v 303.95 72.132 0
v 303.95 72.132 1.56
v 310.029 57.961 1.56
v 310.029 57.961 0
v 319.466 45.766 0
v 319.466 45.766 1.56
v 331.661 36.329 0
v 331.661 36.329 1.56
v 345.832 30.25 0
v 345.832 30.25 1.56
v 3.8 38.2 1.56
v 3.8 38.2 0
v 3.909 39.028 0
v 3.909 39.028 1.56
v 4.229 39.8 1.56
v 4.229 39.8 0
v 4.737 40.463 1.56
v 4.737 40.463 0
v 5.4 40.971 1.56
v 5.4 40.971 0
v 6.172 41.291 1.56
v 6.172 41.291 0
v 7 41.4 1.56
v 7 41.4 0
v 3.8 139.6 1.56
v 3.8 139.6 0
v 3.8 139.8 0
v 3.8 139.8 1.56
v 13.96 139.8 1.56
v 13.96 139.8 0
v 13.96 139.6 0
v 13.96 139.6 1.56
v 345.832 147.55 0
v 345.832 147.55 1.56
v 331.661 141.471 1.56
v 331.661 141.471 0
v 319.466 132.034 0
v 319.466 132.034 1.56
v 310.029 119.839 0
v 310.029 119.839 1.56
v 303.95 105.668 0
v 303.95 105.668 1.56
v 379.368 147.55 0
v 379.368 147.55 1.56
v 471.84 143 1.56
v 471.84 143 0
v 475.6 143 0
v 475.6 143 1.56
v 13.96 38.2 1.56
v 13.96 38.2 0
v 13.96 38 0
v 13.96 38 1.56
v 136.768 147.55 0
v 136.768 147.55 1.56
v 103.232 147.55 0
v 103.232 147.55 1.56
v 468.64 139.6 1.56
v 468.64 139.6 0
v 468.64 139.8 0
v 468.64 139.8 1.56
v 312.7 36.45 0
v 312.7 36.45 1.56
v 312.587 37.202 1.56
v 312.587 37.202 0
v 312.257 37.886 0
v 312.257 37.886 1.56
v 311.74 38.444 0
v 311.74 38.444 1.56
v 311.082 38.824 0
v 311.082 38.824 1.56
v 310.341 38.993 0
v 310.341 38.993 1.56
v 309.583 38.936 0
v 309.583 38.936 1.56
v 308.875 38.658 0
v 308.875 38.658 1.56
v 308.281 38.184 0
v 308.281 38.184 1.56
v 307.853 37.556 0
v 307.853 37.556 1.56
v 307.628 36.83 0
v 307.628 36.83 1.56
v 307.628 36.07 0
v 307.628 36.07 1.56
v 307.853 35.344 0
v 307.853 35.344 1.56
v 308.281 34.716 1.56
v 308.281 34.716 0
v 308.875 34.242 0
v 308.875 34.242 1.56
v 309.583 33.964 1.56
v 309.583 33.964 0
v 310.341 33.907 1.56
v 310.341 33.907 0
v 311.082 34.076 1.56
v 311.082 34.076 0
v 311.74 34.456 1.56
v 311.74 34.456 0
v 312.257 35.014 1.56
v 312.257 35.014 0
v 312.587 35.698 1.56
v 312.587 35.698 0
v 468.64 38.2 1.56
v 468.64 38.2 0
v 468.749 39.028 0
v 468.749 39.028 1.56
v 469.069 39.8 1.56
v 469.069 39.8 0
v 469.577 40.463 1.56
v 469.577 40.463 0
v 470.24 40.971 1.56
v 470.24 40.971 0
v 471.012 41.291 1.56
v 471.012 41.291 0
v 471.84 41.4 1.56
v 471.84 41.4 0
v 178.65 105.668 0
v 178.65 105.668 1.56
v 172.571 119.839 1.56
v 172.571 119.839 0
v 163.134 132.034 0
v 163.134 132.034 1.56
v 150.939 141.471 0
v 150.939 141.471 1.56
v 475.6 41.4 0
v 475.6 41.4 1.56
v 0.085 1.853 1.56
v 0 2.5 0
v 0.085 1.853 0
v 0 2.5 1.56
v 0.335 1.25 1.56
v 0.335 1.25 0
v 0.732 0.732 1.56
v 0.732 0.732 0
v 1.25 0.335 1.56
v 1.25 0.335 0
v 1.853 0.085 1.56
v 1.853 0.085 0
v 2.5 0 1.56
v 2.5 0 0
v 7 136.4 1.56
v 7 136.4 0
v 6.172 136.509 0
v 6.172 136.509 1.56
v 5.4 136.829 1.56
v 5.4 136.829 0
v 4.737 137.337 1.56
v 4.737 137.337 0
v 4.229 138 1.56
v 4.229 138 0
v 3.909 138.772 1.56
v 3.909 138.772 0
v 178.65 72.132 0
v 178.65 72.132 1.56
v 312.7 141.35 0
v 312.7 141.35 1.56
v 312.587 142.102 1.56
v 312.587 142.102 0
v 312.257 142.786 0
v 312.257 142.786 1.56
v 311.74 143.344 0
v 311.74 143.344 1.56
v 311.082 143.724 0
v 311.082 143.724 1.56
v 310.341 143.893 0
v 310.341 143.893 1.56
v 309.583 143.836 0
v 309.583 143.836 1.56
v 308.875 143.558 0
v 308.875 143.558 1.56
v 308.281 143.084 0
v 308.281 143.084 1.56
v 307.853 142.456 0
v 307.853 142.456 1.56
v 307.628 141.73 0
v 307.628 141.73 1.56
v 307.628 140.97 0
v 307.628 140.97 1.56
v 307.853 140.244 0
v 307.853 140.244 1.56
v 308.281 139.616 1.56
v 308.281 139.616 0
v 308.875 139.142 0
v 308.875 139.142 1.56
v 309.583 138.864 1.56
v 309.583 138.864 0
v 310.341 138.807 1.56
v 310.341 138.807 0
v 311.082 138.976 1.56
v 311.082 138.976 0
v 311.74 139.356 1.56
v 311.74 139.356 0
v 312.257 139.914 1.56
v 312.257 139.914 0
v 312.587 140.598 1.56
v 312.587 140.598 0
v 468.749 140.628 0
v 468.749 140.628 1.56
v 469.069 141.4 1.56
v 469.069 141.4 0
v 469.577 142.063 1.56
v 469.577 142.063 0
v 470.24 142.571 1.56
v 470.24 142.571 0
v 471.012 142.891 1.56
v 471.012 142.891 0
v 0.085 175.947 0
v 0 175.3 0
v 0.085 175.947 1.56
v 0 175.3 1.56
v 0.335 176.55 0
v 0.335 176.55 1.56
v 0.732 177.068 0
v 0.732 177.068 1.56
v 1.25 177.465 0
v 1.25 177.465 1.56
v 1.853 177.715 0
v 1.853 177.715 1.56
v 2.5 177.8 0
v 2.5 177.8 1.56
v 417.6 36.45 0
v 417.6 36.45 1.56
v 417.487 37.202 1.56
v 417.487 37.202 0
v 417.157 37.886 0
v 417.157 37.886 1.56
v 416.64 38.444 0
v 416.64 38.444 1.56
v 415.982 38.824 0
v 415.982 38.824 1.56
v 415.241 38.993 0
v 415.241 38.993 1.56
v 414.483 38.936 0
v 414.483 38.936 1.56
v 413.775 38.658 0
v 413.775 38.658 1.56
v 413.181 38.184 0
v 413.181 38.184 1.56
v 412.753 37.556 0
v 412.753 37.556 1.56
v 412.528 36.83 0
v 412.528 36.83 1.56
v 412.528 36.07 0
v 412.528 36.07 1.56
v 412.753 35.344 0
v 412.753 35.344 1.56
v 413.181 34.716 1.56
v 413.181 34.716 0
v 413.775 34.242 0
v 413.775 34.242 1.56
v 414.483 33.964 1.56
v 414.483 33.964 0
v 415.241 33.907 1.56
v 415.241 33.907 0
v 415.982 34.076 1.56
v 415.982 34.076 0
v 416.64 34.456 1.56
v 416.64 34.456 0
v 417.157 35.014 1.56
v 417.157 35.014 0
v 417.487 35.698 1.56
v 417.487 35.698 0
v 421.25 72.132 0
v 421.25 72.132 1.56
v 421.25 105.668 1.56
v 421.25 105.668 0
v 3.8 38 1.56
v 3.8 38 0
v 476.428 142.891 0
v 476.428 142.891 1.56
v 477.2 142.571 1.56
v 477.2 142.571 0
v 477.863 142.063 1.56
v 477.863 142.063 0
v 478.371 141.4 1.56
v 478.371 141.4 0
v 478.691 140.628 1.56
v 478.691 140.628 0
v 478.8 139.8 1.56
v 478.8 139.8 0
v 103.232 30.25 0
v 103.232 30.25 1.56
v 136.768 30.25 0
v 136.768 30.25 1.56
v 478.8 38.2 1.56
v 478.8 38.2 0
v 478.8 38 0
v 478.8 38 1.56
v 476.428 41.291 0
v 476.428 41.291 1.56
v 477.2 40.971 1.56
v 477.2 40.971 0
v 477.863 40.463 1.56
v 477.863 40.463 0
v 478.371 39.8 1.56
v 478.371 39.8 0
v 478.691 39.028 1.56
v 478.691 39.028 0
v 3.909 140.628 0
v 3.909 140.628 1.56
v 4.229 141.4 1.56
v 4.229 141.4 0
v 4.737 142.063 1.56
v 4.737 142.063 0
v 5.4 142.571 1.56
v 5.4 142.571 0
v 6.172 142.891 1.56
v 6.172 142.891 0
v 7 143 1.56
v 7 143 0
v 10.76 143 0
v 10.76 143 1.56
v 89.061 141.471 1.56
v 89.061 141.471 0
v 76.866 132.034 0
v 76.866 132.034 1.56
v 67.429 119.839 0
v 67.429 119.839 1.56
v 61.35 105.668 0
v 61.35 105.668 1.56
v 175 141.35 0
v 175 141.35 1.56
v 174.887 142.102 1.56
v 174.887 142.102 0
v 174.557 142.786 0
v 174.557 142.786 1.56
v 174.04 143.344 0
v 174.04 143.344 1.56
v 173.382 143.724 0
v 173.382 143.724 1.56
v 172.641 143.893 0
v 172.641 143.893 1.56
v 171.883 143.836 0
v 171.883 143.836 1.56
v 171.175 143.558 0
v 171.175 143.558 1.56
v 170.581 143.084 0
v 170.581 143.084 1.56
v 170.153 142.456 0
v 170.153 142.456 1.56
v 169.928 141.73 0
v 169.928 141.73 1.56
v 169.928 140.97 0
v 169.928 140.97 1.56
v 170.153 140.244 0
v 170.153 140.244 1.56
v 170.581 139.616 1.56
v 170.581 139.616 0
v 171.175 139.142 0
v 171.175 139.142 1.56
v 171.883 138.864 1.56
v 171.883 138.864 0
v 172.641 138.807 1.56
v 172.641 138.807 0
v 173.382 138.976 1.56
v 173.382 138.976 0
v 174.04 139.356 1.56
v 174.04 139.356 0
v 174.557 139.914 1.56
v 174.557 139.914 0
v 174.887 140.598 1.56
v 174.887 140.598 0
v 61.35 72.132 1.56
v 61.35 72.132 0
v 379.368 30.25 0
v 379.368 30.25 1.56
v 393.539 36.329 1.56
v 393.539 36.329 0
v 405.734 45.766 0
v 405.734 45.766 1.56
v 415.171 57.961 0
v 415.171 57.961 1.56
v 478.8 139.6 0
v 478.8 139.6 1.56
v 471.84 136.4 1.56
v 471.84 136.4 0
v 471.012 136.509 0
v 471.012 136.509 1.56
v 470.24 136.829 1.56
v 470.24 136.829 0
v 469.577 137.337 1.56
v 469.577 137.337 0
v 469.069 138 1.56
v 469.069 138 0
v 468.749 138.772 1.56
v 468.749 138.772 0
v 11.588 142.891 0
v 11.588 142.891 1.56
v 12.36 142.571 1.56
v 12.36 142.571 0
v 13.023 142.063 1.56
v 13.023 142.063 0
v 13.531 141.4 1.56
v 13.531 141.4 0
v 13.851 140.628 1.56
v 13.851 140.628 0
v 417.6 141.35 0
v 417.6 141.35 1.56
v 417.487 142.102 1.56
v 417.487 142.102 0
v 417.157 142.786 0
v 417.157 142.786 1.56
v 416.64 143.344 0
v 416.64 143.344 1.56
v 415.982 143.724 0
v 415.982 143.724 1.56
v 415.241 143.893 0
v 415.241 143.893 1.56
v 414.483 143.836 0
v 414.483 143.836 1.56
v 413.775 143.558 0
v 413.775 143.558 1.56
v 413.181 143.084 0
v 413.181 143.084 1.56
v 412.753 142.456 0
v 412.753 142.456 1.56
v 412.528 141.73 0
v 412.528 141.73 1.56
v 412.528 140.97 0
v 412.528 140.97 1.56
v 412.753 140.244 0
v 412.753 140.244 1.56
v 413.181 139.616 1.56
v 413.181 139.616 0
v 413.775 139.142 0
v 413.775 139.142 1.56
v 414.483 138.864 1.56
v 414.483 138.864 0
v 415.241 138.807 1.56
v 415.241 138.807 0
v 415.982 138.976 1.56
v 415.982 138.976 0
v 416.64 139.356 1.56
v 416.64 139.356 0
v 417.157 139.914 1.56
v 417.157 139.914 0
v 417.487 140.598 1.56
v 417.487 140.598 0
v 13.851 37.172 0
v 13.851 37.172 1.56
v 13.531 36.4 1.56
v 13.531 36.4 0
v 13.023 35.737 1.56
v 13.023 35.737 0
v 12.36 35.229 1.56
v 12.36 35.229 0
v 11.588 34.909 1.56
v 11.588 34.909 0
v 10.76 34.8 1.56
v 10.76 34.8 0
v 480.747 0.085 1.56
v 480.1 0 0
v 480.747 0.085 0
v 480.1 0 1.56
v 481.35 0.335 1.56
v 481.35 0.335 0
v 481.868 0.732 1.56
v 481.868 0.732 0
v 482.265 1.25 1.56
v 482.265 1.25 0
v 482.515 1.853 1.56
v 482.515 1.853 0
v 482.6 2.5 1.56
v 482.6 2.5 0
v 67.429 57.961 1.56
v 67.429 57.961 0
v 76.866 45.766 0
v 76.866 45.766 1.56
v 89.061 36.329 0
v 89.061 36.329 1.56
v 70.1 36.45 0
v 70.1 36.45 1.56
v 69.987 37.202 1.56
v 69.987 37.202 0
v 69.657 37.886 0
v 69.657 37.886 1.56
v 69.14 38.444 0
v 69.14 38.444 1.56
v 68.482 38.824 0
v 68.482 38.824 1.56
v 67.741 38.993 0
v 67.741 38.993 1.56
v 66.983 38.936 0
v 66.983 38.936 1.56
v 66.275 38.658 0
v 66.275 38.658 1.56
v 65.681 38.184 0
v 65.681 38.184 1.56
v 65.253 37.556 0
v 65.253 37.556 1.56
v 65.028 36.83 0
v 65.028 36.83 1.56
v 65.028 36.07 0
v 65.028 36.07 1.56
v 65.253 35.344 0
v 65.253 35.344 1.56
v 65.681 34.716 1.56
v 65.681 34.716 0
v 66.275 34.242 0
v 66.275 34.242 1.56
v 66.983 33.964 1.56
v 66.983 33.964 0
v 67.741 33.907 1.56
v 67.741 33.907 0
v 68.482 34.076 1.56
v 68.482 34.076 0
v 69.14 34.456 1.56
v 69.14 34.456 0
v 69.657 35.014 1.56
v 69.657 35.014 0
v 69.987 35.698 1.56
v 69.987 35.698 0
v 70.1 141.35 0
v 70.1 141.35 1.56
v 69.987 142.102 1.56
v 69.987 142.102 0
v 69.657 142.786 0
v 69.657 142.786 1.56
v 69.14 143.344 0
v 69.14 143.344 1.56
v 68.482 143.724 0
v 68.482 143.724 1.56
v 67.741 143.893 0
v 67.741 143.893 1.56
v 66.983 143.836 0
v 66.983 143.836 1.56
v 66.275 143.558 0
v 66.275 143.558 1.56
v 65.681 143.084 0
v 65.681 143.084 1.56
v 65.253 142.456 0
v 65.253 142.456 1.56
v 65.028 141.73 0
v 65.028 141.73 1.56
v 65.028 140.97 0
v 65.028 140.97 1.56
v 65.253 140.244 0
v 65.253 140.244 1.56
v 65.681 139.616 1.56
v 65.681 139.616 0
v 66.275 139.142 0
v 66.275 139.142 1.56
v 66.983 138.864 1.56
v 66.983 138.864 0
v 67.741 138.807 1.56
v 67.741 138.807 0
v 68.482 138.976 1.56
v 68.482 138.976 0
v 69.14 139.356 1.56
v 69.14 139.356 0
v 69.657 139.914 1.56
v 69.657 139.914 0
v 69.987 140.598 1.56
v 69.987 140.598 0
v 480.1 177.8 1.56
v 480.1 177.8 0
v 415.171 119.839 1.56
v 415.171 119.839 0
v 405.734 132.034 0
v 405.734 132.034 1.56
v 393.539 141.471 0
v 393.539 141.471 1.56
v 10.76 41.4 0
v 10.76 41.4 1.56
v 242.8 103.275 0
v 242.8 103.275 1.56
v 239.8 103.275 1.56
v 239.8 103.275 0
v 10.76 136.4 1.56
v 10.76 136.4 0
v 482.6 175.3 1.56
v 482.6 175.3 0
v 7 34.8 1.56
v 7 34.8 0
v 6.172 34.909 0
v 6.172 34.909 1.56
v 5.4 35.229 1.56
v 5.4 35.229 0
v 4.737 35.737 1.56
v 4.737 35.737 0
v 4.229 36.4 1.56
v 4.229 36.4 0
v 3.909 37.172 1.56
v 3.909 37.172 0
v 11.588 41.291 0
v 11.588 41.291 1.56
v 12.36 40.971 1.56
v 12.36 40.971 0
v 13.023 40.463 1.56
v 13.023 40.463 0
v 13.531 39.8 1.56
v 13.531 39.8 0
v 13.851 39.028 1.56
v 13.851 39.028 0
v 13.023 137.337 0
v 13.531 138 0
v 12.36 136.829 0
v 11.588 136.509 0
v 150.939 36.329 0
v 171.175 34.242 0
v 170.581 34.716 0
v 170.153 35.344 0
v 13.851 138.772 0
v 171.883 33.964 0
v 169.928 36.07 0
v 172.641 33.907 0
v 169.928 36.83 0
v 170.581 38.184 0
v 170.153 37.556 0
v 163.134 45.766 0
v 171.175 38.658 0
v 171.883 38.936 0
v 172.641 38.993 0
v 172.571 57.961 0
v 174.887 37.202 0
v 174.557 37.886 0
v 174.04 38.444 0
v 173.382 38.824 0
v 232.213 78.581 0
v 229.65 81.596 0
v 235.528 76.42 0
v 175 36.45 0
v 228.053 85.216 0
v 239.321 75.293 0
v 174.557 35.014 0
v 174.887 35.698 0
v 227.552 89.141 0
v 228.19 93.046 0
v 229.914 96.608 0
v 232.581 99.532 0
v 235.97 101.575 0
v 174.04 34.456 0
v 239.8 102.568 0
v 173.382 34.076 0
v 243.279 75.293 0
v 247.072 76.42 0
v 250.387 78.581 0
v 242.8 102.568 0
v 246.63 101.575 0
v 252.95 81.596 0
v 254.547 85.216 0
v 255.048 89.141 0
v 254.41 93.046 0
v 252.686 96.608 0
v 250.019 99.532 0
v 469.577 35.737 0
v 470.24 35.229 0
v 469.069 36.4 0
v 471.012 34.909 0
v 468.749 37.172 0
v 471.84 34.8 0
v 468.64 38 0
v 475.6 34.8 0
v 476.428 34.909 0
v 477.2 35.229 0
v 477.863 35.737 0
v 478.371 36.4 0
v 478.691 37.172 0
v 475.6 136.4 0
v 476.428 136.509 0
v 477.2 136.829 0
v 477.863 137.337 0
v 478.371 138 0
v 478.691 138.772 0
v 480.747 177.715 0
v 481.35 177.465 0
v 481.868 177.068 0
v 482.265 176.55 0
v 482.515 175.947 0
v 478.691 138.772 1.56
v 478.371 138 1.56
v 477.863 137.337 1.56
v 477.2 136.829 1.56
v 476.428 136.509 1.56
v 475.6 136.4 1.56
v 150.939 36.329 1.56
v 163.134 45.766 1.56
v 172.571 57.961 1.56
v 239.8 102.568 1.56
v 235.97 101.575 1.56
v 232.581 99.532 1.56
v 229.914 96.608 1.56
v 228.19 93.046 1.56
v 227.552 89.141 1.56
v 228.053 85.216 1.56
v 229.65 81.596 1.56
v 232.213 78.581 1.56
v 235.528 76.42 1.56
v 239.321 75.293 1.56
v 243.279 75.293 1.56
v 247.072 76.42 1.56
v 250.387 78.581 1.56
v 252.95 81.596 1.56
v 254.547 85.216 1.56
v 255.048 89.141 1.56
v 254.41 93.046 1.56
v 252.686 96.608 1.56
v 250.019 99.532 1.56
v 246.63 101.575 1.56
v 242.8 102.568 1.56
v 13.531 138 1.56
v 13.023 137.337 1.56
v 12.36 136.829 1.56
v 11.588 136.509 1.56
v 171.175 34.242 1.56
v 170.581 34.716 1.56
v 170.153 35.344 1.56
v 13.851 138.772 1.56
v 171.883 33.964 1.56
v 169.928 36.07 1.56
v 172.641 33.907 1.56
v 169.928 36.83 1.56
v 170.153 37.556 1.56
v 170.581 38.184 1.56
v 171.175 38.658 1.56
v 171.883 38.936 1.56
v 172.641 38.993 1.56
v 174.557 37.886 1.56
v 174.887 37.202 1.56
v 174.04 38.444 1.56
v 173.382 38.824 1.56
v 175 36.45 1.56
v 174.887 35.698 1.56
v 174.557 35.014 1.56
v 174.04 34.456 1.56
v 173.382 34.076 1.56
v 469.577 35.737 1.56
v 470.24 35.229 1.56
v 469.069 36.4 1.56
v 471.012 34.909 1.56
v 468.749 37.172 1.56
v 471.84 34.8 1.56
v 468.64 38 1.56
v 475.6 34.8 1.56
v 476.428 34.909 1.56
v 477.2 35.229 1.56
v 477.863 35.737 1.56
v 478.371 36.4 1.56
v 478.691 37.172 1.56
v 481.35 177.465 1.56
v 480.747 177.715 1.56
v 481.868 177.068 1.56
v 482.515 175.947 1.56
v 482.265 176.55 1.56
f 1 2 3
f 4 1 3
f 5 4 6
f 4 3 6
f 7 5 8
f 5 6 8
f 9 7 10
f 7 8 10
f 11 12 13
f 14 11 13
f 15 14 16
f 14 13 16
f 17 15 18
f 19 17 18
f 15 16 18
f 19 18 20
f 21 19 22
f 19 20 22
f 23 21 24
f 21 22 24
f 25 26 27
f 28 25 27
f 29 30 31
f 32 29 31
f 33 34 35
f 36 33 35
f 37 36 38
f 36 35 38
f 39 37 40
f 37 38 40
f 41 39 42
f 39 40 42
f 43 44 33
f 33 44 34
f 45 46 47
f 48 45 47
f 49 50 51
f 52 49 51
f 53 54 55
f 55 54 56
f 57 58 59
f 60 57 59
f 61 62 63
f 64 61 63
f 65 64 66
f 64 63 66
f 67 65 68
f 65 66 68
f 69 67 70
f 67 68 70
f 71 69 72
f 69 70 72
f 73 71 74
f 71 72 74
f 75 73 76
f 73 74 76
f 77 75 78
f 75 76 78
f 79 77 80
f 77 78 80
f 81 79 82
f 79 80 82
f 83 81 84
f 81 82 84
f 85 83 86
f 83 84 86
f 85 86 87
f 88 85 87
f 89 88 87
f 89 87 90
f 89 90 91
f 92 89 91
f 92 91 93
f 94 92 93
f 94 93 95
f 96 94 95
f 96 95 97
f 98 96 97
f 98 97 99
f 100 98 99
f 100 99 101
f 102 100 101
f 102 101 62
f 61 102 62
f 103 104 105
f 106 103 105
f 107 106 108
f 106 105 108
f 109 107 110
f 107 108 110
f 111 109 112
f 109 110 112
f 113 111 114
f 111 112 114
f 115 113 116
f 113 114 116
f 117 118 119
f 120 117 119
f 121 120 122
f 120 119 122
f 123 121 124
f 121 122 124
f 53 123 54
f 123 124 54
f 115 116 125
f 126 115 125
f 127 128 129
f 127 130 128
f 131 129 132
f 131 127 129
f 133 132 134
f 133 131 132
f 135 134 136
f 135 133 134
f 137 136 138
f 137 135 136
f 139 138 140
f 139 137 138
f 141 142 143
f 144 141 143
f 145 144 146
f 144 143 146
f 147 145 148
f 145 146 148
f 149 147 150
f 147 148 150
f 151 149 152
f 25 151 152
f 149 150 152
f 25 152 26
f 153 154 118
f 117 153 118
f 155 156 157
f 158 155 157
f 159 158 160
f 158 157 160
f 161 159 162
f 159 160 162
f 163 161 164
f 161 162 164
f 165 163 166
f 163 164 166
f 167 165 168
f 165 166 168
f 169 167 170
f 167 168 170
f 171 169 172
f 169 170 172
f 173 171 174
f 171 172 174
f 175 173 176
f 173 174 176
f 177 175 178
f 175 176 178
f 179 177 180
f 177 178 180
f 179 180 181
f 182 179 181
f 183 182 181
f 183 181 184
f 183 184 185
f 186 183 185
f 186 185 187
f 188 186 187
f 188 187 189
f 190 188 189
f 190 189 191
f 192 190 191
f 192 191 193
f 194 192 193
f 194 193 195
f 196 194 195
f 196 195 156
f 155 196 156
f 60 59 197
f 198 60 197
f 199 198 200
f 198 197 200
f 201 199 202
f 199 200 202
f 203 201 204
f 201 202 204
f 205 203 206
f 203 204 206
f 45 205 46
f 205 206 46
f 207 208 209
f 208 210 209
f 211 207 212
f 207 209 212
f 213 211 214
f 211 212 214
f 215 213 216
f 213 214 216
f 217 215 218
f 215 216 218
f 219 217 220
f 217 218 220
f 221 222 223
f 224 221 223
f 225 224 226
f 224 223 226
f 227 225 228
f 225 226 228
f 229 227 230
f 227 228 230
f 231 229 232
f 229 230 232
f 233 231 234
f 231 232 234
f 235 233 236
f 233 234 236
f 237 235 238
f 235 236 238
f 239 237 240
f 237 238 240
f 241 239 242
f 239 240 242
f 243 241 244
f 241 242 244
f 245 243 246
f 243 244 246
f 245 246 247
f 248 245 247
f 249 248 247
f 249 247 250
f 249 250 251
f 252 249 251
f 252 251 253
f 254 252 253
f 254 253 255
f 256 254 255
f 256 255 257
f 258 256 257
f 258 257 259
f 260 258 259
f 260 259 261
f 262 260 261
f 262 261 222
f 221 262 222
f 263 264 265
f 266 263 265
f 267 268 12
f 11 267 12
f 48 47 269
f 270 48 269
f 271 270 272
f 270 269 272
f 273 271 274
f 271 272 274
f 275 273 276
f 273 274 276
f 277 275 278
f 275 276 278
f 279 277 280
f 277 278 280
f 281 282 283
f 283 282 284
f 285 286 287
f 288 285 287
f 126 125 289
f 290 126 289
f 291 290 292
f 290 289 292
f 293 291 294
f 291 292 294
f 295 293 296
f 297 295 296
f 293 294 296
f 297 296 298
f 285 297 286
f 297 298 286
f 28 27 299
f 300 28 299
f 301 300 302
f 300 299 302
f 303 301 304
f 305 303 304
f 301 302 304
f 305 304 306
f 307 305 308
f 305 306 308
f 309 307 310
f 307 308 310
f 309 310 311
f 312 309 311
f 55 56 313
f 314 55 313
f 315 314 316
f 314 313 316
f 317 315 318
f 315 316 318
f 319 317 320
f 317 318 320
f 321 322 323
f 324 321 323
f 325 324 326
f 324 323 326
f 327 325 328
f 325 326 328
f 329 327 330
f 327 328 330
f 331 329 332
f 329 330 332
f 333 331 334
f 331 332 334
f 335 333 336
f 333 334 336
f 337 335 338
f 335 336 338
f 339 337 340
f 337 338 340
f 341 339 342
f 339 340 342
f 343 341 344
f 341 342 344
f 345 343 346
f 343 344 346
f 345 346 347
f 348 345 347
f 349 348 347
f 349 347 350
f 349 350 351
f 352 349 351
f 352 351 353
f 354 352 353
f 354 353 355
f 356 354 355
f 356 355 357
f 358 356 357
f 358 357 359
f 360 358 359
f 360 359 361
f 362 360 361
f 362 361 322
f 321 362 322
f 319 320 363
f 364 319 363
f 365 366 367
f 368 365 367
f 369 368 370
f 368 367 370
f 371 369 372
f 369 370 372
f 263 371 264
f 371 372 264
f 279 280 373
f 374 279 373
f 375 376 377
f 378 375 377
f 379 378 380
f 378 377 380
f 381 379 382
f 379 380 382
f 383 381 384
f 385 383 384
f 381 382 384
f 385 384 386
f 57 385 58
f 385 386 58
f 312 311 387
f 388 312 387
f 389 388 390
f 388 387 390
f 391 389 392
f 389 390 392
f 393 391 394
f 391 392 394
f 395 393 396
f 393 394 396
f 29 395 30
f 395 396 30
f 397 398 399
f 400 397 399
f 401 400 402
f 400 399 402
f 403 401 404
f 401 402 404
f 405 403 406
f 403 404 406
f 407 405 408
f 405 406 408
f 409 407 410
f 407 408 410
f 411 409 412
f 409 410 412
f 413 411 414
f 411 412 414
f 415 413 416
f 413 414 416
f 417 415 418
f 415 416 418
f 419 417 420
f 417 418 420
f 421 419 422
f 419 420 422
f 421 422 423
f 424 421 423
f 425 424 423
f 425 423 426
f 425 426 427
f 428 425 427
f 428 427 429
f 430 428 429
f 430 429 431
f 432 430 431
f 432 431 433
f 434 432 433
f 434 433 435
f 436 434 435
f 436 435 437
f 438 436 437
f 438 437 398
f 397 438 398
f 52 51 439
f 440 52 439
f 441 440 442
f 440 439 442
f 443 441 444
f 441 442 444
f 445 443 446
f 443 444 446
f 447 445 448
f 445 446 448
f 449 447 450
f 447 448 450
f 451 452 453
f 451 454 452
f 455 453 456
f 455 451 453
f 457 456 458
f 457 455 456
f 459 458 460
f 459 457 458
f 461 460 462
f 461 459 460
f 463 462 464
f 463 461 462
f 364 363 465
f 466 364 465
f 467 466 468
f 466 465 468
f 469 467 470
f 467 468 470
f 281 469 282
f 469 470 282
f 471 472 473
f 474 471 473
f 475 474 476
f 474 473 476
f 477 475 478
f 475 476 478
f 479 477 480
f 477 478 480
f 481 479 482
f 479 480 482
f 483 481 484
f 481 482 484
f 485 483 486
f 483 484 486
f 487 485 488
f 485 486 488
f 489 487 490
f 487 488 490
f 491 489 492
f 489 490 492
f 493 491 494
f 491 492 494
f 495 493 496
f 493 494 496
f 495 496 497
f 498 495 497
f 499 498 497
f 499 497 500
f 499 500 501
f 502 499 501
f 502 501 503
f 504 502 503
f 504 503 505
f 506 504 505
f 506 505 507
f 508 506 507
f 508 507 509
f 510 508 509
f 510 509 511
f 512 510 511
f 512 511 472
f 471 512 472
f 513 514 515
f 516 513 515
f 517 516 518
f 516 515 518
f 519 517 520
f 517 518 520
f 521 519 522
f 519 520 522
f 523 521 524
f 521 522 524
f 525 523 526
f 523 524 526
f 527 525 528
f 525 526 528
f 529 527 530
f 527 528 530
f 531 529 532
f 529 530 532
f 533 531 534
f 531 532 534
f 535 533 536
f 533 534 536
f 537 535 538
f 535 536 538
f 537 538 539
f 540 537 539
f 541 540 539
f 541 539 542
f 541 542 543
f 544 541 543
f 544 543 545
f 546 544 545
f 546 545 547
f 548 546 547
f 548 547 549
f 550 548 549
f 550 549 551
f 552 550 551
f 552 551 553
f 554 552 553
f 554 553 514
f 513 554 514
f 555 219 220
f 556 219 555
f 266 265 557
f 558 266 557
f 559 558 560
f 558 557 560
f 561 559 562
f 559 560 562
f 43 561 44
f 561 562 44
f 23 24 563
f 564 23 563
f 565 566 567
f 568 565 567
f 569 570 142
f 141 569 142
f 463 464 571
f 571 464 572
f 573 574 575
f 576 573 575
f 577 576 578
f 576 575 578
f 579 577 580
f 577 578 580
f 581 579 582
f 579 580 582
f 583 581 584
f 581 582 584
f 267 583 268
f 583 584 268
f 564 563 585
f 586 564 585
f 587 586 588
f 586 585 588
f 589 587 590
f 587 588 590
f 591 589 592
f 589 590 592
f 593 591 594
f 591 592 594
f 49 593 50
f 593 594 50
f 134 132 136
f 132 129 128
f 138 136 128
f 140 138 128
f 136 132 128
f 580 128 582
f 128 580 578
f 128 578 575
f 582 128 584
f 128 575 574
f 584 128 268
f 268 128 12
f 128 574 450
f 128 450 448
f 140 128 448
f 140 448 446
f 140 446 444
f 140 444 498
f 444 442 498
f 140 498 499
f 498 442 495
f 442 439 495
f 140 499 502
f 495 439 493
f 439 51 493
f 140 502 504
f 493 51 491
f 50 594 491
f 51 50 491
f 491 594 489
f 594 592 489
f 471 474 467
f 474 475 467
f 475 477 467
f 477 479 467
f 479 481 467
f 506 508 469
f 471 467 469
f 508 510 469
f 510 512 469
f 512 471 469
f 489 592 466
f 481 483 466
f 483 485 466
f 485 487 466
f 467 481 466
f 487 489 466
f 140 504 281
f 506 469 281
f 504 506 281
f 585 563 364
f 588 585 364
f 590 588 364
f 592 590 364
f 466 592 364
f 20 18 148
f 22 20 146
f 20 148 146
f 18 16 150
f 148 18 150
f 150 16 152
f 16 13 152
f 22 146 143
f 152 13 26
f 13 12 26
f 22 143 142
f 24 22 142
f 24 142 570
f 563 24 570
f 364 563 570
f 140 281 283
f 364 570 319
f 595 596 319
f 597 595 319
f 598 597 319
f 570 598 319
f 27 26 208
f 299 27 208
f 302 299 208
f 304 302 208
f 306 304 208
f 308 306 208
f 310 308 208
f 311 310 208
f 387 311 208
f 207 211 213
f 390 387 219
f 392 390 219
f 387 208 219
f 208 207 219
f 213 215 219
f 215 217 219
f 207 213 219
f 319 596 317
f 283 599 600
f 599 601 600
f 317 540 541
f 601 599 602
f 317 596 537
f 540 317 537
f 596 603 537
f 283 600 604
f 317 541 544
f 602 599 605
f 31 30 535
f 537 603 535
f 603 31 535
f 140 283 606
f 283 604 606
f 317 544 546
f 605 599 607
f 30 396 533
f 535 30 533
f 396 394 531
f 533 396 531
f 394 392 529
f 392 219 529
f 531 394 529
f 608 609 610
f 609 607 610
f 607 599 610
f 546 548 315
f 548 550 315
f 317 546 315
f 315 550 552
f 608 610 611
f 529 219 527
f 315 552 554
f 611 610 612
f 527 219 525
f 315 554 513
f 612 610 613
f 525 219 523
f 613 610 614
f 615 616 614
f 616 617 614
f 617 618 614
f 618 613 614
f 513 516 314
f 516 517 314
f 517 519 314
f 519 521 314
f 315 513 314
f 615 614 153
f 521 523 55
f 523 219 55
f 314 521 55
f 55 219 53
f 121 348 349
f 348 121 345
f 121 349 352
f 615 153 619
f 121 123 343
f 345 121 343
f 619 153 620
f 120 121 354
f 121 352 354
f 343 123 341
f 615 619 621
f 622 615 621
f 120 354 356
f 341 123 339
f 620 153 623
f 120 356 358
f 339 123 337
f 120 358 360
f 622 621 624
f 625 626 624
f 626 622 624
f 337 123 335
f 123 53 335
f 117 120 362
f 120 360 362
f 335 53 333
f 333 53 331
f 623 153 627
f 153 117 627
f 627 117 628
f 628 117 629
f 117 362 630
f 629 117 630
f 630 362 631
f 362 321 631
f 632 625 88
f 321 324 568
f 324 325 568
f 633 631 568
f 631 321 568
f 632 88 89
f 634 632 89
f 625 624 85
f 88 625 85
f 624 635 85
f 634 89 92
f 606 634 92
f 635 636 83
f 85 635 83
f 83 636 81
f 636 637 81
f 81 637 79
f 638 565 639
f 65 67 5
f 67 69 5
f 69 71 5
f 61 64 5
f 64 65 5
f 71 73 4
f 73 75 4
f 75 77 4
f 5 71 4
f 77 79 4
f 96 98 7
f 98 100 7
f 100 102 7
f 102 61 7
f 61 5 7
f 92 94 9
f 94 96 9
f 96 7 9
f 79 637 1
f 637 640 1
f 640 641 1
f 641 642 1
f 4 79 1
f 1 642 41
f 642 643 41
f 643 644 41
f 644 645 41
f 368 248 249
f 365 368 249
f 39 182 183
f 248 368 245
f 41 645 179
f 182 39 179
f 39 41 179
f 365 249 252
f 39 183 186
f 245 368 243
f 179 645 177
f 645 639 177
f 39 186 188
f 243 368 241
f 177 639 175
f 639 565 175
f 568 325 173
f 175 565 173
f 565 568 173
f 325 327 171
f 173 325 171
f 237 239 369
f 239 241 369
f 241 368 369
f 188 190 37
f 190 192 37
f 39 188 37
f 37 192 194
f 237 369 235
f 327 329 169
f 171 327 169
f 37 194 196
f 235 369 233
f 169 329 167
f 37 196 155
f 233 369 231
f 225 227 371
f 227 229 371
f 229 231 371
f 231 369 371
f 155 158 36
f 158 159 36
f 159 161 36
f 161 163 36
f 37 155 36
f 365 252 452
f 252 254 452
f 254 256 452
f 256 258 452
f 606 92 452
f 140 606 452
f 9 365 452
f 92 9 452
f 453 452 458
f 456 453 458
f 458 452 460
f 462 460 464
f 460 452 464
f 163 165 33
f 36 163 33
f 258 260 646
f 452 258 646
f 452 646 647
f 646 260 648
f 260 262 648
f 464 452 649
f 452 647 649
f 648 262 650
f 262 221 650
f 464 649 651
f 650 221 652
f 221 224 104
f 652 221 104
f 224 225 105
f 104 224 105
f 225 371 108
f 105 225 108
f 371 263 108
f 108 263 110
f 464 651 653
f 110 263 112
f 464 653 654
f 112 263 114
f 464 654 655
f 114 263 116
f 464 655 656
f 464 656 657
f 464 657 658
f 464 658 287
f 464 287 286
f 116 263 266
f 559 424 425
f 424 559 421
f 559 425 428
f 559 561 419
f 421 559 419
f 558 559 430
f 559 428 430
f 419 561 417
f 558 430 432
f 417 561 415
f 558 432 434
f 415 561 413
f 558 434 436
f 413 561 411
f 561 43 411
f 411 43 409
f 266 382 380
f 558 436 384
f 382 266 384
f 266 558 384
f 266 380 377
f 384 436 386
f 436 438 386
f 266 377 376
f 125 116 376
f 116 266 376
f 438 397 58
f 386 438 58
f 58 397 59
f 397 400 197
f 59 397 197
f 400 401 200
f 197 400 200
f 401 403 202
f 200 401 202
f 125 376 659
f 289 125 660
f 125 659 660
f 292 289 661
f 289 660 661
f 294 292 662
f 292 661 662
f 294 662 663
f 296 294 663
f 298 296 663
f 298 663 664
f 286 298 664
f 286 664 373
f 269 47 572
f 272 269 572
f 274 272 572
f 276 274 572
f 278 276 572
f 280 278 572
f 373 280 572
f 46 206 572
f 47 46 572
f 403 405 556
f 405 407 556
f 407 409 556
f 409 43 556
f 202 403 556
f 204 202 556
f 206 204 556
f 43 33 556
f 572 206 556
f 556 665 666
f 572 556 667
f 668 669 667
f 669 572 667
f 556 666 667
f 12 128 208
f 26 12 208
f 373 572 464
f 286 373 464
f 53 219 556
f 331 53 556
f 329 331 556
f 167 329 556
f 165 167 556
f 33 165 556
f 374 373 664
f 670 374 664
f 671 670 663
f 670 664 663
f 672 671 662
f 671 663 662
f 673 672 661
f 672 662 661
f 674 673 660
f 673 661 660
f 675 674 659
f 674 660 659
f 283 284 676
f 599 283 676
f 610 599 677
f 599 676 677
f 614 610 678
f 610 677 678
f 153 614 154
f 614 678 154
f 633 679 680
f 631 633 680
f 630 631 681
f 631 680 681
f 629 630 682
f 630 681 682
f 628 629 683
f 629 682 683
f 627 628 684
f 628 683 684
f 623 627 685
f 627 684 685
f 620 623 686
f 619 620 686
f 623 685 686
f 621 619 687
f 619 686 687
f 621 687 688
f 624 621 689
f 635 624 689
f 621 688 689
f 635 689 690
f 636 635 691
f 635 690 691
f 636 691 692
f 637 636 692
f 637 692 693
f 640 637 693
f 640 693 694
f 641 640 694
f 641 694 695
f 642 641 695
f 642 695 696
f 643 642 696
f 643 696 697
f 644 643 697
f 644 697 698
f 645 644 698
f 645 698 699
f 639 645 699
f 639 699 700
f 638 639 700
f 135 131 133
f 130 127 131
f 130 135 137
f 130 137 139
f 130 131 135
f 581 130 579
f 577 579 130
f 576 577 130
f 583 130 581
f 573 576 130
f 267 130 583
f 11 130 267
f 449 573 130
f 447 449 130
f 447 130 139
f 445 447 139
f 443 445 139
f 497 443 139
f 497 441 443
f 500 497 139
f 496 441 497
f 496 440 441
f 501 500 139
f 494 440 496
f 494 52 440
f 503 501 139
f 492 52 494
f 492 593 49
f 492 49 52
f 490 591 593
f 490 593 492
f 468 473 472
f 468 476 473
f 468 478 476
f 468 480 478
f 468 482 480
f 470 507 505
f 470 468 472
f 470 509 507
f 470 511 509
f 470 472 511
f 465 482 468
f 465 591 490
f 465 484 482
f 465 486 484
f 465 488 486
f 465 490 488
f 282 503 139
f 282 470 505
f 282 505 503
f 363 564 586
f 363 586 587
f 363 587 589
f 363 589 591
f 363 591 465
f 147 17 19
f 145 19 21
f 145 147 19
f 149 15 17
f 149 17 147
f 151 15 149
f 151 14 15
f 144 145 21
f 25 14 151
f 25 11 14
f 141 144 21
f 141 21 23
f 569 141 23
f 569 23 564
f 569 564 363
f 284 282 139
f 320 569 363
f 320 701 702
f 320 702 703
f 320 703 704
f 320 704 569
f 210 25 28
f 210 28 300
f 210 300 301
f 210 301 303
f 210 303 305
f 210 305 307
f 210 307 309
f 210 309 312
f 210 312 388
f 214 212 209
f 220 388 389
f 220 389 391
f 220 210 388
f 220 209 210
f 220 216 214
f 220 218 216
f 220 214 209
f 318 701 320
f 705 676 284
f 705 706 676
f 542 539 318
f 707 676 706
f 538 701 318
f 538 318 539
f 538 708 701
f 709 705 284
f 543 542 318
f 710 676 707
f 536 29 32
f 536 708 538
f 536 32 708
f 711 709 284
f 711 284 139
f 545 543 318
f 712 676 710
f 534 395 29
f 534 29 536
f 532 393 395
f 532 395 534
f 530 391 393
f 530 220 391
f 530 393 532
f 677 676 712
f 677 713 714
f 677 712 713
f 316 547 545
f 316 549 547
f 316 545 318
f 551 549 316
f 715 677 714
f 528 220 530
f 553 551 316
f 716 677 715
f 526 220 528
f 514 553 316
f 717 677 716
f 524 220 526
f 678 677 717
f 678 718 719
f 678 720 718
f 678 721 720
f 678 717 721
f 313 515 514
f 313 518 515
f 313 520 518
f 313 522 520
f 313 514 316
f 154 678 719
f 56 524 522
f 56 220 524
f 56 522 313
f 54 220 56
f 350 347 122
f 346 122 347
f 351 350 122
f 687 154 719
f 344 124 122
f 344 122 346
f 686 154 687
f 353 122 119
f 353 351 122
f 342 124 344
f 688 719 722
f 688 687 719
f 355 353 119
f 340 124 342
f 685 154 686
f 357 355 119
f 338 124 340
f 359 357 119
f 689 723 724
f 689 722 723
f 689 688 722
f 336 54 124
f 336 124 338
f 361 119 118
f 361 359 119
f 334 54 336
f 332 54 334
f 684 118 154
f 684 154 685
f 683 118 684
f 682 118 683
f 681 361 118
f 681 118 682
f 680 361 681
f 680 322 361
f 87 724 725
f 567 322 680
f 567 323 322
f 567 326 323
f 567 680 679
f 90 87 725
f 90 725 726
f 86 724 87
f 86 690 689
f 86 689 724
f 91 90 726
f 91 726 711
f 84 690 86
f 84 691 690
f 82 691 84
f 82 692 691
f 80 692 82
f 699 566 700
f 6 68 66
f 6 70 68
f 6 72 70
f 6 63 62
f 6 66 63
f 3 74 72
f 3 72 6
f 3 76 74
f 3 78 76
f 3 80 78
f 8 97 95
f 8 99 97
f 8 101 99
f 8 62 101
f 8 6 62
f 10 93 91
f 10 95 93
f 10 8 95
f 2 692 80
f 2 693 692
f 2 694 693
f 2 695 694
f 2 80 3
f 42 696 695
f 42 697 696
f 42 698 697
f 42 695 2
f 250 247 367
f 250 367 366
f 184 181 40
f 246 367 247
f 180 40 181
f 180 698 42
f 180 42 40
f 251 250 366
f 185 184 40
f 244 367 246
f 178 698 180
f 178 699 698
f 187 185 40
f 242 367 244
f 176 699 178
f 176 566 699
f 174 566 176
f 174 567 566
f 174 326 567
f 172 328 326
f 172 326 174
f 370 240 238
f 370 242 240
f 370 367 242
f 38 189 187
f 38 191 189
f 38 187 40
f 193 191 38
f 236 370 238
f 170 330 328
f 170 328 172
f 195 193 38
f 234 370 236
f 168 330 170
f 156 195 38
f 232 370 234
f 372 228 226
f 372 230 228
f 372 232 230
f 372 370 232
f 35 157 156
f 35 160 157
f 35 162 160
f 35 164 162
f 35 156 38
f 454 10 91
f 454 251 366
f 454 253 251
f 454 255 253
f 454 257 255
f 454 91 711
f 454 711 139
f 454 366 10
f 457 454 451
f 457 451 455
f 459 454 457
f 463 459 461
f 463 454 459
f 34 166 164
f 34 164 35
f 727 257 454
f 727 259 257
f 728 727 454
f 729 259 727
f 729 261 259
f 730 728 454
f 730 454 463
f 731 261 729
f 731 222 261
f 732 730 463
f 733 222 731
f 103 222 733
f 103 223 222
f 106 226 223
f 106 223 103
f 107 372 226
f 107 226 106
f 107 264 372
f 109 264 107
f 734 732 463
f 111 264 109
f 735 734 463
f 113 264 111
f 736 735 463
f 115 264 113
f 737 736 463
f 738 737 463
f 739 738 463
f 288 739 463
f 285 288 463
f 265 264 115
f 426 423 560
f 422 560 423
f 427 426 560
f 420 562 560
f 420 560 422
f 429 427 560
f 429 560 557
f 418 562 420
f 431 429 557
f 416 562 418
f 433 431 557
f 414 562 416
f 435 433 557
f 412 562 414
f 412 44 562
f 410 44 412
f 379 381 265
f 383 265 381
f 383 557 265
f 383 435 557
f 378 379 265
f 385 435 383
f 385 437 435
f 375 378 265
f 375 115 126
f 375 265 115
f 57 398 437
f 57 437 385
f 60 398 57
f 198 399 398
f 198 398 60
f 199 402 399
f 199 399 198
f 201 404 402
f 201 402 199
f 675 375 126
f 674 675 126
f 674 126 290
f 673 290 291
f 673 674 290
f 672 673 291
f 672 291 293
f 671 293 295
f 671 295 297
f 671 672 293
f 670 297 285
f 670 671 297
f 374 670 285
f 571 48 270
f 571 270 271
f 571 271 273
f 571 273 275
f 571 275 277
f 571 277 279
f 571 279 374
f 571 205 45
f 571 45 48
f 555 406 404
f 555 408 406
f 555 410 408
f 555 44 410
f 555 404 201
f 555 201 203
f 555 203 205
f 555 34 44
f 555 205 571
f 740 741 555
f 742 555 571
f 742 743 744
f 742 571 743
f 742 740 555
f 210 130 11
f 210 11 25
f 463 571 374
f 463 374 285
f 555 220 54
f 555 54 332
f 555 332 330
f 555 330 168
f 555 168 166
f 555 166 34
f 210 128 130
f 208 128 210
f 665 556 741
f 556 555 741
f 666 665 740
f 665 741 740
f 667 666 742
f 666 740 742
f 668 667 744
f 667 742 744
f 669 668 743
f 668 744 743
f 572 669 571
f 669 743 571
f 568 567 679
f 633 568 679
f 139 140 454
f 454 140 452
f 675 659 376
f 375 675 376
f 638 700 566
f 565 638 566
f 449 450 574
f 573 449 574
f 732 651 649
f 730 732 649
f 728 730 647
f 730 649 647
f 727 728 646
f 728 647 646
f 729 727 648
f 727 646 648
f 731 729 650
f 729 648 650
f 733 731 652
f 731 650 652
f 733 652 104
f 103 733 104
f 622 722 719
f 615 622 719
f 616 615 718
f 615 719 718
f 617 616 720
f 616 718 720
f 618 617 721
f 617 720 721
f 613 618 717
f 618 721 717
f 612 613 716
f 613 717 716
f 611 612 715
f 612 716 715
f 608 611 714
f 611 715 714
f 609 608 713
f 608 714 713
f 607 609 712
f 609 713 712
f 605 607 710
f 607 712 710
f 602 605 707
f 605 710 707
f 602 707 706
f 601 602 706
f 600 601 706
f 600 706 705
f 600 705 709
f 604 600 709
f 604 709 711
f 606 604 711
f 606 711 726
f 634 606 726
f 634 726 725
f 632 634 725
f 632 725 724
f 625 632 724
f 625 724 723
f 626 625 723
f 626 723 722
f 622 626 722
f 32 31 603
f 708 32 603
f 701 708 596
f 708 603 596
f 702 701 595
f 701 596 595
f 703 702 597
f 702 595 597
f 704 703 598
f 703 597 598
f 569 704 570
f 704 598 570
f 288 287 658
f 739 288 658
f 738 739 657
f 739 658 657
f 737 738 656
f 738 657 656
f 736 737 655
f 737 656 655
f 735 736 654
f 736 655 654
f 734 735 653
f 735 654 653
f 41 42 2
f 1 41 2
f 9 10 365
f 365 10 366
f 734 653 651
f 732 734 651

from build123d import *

# Parameters (mm, degrees)
F0_W     = 482.6
F0_H     = 177.8
F1_DEPTH = 1.56
F2_R     = 2.5
F3_R     = 2.55
F4_DEPTH = 25


with BuildPart() as f1:
    # F0 (on Top) → F1 (new body)
    with BuildSketch(Plane.XY):
        with Locations((241.3, 88.9)):
            Rectangle(F0_W, F0_H)
        with BuildLine():
            Line((7, 41.4), (10.76, 41.4))
            ThreePointArc((10.76, 41.4), (13.022742, 40.462742), (13.96, 38.2))
            Line((13.96, 38.2), (13.96, 38))
            ThreePointArc((13.96, 38), (13.022742, 35.737258), (10.76, 34.8))
            Line((10.76, 34.8), (7, 34.8))
            ThreePointArc((7, 34.8), (4.737258, 35.737258), (3.8, 38))
            Line((3.8, 38), (3.8, 38.2))
            ThreePointArc((3.8, 38.2), (4.737258, 40.462742), (7, 41.4))
        make_face(mode=Mode.SUBTRACT)
        with BuildLine():
            Line((468.64, 38), (468.64, 38.2))
            ThreePointArc((468.64, 38.2), (469.577258, 40.462742), (471.84, 41.4))
            Line((471.84, 41.4), (475.6, 41.4))
            ThreePointArc((475.6, 41.4), (477.862742, 40.462742), (478.8, 38.2))
            Line((478.8, 38.2), (478.8, 38))
            ThreePointArc((478.8, 38), (477.862742, 35.737258), (475.6, 34.8))
            Line((475.6, 34.8), (471.84, 34.8))
            ThreePointArc((471.84, 34.8), (469.577258, 35.737258), (468.64, 38))
        make_face(mode=Mode.SUBTRACT)
        with BuildLine():
            Line((10.76, 136.4), (7, 136.4))
            ThreePointArc((7, 136.4), (4.737258, 137.337258), (3.8, 139.6))
            Line((3.8, 139.6), (3.8, 139.8))
            ThreePointArc((3.8, 139.8), (4.737258, 142.062742), (7, 143))
            Line((7, 143), (10.76, 143))
            ThreePointArc((10.76, 143), (13.022742, 142.062742), (13.96, 139.8))
            Line((13.96, 139.8), (13.96, 139.6))
            ThreePointArc((13.96, 139.6), (13.022742, 137.337258), (10.76, 136.4))
        make_face(mode=Mode.SUBTRACT)
        with BuildLine():
            Line((478.8, 139.8), (478.8, 139.6))
            ThreePointArc((478.8, 139.6), (477.862742, 137.337258), (475.6, 136.4))
            Line((475.6, 136.4), (471.84, 136.4))
            ThreePointArc((471.84, 136.4), (469.577258, 137.337258), (468.64, 139.6))
            Line((468.64, 139.6), (468.64, 139.8))
            ThreePointArc((468.64, 139.8), (469.577258, 142.062742), (471.84, 143))
            Line((471.84, 143), (475.6, 143))
            ThreePointArc((475.6, 143), (477.862742, 142.062742), (478.8, 139.8))
        make_face(mode=Mode.SUBTRACT)
    extrude(amount=F1_DEPTH)

    # F2
    f2_edges = [f1.edges().sort_by_distance(p)[0] for p in [
        (0, 177.8, 0.78),
        (0, 0, 0.78),
        (482.6, 177.8, 0.78),
        (482.6, 0, 0.78),
    ]]
    fillet(f2_edges, radius=F2_R)

    # F3 (on face) → F4 (cut)
    with BuildSketch(Plane.XY.offset(1.56)):
        with BuildLine():
            Line((136.768348, 147.55), (103.231652, 147.55))
            ThreePointArc((103.231652, 147.55), (76.866486, 132.033514), (61.35, 105.668348))
            Line((61.35, 105.668348), (61.35, 72.131652))
            ThreePointArc((61.35, 72.131652), (76.866486, 45.766486), (103.231652, 30.25))
            Line((103.231652, 30.25), (136.768348, 30.25))
            ThreePointArc((136.768348, 30.25), (163.133514, 45.766486), (178.65, 72.131652))
            Line((178.65, 72.131652), (178.65, 105.668348))
            ThreePointArc((178.65, 105.668348), (163.133514, 132.033514), (136.768348, 147.55))
        make_face()
        with Locations((67.55, 141.35)):
            Circle(F3_R)
        with Locations((67.55, 36.45)):
            Circle(F3_R)
        with Locations((172.45, 141.35)):
            Circle(F3_R)
        with Locations((172.45, 36.45)):
            Circle(F3_R)
        with BuildLine():
            Line((379.368348, 147.55), (345.831652, 147.55))
            ThreePointArc((345.831652, 147.55), (319.466486, 132.033514), (303.95, 105.668348))
            Line((303.95, 105.668348), (303.95, 72.131652))
            ThreePointArc((303.95, 72.131652), (319.466486, 45.766486), (345.831652, 30.25))
            Line((345.831652, 30.25), (379.368348, 30.25))
            ThreePointArc((379.368348, 30.25), (405.733514, 45.766486), (421.25, 72.131652))
            Line((421.25, 72.131652), (421.25, 105.668348))
            ThreePointArc((421.25, 105.668348), (405.733514, 132.033514), (379.368348, 147.55))
        make_face()
        with Locations((415.05, 36.45)):
            Circle(F3_R)
        with Locations((310.15, 36.45)):
            Circle(F3_R)
        with Locations((415.05, 141.35)):
            Circle(F3_R)
        with Locations((310.15, 141.35)):
            Circle(F3_R)
        with BuildLine():
            Line((239.8, 103.275), (239.8, 102.567937))
            ThreePointArc((239.8, 102.567937), (241.3, 75.15), (242.8, 102.567937))
            Line((242.8, 102.567937), (242.8, 103.275))
            Line((242.8, 103.275), (241.3, 103.275))
            Line((241.3, 103.275), (239.8, 103.275))
        make_face()
    extrude(amount=-F4_DEPTH, mode=Mode.SUBTRACT)


solid = f1.part
